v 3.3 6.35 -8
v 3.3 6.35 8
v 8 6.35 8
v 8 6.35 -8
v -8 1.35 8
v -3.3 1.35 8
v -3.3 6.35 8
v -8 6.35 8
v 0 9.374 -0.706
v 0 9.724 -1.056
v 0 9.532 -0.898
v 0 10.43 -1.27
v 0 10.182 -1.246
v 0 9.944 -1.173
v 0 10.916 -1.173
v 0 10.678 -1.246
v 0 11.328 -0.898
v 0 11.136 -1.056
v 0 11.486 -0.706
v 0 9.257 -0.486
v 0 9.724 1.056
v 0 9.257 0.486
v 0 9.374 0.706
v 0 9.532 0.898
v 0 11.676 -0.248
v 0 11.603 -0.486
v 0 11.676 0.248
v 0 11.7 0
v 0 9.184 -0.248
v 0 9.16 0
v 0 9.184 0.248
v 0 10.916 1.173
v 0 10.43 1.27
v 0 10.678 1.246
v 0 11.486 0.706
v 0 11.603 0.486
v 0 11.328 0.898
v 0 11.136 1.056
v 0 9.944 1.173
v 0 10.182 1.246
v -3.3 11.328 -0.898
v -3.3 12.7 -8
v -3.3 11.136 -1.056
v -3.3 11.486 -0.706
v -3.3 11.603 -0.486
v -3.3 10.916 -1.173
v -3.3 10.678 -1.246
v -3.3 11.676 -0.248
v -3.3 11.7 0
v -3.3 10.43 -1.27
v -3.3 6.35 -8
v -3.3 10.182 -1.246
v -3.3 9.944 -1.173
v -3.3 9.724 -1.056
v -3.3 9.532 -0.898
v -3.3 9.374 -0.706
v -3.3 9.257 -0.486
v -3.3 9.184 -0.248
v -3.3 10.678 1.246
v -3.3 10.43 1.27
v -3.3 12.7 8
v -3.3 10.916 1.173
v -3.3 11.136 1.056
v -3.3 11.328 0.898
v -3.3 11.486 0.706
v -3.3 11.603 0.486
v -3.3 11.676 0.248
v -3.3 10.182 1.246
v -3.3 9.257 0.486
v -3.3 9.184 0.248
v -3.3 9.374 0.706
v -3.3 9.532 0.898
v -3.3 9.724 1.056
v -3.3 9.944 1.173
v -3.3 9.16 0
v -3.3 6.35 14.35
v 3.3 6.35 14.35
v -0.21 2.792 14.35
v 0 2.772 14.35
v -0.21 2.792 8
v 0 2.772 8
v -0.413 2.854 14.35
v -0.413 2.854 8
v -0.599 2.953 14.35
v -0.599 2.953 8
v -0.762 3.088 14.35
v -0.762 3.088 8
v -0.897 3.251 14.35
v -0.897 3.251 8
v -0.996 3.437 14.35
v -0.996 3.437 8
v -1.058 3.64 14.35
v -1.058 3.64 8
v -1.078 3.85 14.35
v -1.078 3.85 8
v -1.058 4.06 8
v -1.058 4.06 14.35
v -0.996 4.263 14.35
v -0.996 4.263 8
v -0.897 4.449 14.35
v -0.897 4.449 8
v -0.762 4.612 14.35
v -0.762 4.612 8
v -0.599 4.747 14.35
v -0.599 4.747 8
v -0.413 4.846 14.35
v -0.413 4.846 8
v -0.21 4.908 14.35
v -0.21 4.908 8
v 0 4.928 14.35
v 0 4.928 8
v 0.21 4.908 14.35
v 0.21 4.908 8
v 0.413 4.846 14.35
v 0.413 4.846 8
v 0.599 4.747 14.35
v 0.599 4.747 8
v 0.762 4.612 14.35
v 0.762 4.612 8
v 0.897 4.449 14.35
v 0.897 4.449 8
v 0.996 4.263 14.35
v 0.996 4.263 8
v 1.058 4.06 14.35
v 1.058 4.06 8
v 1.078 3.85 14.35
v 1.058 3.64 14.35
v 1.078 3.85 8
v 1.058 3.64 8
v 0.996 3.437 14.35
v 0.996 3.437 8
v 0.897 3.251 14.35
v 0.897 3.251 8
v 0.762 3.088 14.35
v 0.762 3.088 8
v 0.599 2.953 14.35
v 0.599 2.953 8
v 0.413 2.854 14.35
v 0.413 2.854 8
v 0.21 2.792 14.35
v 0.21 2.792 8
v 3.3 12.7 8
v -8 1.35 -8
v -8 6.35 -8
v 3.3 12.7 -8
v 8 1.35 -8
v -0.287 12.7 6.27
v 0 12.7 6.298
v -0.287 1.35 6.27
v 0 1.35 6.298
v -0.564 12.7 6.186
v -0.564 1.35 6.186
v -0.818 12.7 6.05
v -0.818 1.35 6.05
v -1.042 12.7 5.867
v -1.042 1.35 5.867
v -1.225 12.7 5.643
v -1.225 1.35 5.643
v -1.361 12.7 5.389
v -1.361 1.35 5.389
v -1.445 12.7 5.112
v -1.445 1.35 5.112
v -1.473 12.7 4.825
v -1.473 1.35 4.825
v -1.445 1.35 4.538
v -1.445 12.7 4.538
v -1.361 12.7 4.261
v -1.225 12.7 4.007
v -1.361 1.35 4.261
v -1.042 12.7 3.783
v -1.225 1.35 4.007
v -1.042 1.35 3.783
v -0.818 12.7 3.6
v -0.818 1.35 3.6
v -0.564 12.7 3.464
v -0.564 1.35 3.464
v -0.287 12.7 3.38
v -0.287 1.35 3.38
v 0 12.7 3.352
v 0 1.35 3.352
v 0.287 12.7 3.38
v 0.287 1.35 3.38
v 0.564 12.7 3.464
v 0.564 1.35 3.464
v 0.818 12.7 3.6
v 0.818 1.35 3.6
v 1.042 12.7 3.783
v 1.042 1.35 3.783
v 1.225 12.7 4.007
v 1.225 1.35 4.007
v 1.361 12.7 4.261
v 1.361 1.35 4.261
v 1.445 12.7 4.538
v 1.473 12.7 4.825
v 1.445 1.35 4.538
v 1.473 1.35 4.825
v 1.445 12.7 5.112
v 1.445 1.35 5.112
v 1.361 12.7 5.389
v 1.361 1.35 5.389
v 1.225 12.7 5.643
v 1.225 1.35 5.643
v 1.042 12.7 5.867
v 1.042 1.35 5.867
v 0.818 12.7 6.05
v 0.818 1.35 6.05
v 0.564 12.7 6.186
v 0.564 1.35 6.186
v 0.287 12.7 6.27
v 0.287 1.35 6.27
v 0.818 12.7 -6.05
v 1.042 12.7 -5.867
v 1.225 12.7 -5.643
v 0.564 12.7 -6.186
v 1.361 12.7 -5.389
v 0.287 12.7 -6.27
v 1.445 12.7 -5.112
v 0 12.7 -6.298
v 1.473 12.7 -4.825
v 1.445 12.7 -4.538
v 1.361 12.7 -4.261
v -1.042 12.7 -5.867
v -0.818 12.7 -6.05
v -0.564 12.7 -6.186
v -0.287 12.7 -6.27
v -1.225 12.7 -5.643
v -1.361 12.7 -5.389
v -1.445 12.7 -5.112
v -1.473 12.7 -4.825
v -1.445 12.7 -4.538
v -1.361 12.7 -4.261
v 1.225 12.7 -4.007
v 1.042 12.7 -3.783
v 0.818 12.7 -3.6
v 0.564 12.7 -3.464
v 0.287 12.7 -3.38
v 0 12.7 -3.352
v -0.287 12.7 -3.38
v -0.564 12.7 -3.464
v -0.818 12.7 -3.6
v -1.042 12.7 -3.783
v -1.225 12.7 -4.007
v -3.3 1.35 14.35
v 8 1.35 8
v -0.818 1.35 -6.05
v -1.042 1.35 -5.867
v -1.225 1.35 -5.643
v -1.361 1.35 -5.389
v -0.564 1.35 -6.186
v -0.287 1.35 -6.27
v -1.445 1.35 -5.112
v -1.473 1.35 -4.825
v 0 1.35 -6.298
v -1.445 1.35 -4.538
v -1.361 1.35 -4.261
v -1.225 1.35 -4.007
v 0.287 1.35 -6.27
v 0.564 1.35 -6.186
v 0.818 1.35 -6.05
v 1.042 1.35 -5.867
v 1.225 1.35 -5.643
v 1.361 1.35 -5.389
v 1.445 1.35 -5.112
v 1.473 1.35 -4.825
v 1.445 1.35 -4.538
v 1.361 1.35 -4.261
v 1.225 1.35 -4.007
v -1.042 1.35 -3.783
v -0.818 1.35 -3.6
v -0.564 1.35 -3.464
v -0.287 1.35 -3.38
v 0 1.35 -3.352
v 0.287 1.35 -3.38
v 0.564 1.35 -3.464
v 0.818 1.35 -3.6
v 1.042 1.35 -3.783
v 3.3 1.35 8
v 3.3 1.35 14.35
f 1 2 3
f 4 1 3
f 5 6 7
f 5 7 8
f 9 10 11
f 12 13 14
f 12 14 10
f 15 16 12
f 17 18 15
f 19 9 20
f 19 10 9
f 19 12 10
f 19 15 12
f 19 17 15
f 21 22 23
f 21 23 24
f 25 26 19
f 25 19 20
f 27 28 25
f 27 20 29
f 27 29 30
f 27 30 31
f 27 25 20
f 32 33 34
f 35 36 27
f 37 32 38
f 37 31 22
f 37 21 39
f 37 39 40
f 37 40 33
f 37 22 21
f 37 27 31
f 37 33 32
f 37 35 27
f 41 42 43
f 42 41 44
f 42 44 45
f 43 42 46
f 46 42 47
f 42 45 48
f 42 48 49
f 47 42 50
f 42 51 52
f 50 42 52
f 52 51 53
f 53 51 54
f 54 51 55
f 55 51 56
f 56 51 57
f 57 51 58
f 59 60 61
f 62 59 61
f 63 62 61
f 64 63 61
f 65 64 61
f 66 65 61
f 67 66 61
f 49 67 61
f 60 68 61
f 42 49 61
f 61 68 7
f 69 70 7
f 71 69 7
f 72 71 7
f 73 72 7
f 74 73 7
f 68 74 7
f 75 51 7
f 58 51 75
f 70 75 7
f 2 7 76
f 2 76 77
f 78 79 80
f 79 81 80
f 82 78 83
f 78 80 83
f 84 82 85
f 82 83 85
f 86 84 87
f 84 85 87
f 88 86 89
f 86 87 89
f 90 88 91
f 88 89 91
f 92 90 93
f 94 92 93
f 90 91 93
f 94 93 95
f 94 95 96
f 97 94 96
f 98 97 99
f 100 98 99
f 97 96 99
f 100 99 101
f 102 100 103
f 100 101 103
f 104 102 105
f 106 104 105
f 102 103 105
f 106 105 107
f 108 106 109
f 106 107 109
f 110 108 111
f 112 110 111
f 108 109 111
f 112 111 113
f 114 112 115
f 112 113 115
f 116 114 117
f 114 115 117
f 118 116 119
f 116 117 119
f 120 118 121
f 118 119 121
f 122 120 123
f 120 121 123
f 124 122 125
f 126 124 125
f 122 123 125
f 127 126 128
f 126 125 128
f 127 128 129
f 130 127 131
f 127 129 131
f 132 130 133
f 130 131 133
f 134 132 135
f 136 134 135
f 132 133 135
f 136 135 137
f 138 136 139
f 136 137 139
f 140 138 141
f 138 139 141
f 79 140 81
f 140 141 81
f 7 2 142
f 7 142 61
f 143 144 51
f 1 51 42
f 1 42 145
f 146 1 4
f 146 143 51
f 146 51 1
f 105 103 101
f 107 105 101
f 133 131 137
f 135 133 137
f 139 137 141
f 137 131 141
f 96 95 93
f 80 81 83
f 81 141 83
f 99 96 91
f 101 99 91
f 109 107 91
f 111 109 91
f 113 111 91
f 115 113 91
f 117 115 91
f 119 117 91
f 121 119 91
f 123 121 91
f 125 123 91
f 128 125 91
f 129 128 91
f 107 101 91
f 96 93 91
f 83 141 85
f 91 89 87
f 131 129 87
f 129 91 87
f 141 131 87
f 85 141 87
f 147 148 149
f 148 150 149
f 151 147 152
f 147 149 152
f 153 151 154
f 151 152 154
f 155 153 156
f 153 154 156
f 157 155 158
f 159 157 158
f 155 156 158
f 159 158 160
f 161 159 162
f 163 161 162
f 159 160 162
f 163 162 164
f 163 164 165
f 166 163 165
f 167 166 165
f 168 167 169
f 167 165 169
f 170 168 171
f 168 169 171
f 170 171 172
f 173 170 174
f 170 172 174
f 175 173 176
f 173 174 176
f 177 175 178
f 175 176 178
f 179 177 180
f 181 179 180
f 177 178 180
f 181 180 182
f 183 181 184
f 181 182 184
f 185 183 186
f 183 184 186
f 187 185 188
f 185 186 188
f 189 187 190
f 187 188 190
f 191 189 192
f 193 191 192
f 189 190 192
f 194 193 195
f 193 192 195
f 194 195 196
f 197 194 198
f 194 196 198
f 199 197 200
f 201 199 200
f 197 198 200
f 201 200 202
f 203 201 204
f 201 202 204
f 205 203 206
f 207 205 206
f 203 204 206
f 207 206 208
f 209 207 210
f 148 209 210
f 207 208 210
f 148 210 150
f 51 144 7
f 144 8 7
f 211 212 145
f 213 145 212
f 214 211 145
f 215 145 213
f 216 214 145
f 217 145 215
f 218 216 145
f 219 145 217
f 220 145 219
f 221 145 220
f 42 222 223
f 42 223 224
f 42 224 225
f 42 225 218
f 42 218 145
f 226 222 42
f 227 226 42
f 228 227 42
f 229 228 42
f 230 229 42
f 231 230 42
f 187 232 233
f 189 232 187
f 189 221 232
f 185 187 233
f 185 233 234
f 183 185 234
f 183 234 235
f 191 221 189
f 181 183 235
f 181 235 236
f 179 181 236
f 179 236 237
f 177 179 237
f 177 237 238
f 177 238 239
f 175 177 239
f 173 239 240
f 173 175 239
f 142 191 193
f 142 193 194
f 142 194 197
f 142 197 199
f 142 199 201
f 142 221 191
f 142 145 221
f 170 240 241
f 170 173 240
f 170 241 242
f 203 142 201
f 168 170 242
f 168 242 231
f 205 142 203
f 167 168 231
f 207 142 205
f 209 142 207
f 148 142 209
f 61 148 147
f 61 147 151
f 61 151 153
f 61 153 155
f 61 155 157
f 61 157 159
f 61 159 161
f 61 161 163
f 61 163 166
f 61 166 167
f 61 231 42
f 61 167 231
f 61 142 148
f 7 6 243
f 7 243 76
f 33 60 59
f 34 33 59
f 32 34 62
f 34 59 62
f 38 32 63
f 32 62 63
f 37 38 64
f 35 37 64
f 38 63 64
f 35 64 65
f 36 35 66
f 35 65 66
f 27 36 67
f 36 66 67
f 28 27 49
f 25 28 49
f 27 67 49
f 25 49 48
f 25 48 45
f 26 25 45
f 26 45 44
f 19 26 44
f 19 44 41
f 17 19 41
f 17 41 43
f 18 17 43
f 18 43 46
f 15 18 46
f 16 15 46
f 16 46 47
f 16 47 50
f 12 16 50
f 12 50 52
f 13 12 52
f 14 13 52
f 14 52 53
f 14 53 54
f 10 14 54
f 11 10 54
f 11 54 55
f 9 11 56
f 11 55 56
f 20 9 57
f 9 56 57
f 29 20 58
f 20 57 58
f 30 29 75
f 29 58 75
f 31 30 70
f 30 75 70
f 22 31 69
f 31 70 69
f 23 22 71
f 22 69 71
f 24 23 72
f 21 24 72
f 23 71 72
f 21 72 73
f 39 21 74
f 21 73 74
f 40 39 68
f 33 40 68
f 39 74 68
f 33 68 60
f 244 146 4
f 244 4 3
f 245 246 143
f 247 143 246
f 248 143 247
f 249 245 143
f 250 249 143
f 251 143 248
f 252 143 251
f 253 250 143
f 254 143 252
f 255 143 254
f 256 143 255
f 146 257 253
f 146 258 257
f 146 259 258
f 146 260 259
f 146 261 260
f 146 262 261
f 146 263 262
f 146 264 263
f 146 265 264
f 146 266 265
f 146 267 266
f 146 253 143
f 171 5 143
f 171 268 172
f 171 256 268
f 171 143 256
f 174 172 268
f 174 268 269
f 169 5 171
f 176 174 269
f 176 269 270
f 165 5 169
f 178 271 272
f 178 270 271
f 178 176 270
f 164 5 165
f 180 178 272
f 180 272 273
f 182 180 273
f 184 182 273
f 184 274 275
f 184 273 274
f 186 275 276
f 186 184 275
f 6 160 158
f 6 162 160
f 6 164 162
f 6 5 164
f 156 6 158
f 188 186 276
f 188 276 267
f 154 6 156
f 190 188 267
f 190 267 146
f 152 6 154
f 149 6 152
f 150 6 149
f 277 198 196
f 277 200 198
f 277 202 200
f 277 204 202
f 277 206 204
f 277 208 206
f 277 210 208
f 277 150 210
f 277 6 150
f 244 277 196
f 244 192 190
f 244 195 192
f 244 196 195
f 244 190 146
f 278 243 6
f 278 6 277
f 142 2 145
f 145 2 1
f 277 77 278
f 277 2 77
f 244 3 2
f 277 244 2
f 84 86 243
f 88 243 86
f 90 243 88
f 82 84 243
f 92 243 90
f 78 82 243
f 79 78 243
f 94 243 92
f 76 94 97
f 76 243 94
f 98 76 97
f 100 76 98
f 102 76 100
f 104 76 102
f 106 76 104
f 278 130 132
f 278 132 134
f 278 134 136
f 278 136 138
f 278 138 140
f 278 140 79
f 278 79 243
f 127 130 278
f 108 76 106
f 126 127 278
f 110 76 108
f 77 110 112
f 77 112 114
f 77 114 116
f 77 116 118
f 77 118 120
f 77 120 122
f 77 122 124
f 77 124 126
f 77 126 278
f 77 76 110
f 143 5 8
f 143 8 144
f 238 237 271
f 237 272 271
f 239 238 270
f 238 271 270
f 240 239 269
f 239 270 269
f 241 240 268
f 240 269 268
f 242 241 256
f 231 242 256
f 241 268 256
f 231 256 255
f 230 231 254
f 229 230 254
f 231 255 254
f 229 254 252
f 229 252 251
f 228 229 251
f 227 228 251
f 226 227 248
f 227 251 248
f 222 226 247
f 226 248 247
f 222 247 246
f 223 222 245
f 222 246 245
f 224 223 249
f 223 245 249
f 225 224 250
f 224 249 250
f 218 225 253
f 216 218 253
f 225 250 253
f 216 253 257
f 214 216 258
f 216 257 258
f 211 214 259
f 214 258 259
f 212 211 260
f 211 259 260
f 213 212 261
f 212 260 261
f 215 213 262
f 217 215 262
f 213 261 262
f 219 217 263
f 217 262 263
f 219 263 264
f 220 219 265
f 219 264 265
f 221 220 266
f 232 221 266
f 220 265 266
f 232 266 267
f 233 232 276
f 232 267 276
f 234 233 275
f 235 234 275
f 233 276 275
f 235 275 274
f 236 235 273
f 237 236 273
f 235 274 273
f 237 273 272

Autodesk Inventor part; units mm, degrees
ref_plane "YZ Plane" through (0, 0, 0) normal (1, 0, 0) x (0, 1, 0)
ref_plane "XZ Plane" through (0, 0, 0) normal (0, 1, 0) x (-1, 0, 0)
ref_plane "XY Plane" through (0, 0, 0) normal (0, 0, 1) x (1, 0, 0)
sketch "Sketch1" plane through (0, 0, 0) normal (0, 1, 0) x (-1, 0, 0)
  point P0 (0, 0)
sketch "Sketch2" plane through (0, 0, 0) normal (0, 1, 0) x (-1, 0, 0)
  line L0 (3.3, 8) -> (-3.3, 8)
  line L1 (-3.3, 8) -> (-3.3, -8)
  line L2 (-3.3, -8) -> (3.3, -8)
  line L3 (3.3, -8) -> (3.3, 8)
  line L4 (3.3, 8) -> (-3.3, -8) construction
  line L5 (-3.3, 8) -> (3.3, -8) construction
  point P0 (0, 0)
  dimension "d0" = 6.6
  dimension "d1" = 16
extrude "Extrusion1" add sketch "Sketch2" along normal blind 6.35
sketch "Sketch3" plane through (0, 0, 0) normal (0, -1, 0) x (1, 0, 0)
  line L0 (-8, -8) -> (8, -8)
  line L1 (8, -8) -> (8, 8)
  line L2 (8, 8) -> (-8, 8)
  line L3 (-8, 8) -> (-8, -8)
  line L4 (-8, -8) -> (8, 8) construction
  line L5 (8, -8) -> (-8, 8) construction
  point P0 (0, 0)
  dimension "d13" = 16
  dimension "d14" = 16
move or copy body "Move1" bodies to move or copy 1 copy no translate (0, 6.35, 0)
extrude "Extrusion2" add sketch "Sketch3" against normal up to surface (6.35 mm away)
chamfer "Chamfer1" [suppressed]
chamfer "Chamfer2" [suppressed]
sketch "Sketch4" plane through (-3.3, 12.7, -8) normal (0, 1, 0) x (1, 0, 0)
  line L0 (4.4354, -16) -> (2.1646, -16) projected
  line L1 (-4.7, 0) -> (11.3, 0) projected
  point P0 (3.3, -8)
  point P1 (3.3, -3.175)
  point P2 (3.3, -12.825)
fillet "Fillet1" [suppressed]
sketch "Sketch5" plane through (-3.3, 12.7, 8) normal (0, 0, 1) x (1, 0, 0)
  circle A0 centre (3.3, -9.5232) radius 2.9337
  point P0 (3.3, -12.7)
extrude "Extrusion3" [suppressed]
hole "Hole3" [suppressed]
chamfer "Chamfer3" [suppressed]
sketch "Sketch6" plane through (-3.3, 12.7, -8) normal (-1, 0, 0) x (0, 0, 1)
  line L0 (0, 0) -> (16, 0) projected
  circle A0 centre (8, -2.27) radius 1.27
  point P0 (8, -12.7)
  dimension "d62" = 2.54
extrude "Extrusion4" cut sketch "Sketch6" against normal blind 3.3
sketch "Sketch7" plane through (-3.3, 12.7, 8) normal (0, 0, 1) x (1, 0, 0)
  line L0 (0, -6.35) -> (0, 0) projected
  line L1 (11.3, -12.7) -> (-4.7, -12.7) projected
  line L2 (0, -6.35) -> (6.6, -6.35)
  line L3 (6.6, -6.35) -> (6.6, -12.7)
  line L4 (6.6, -12.7) -> (0, -12.7)
  line L5 (0, -12.7) -> (0, -6.35)
  point P0 (3.3, -12.7)
  dimension "d65" = 6.6
extrude "Extrusion5" add sketch "Sketch7" along normal blind 6.35
sketch "Sketch8" plane through (0, 0, 0) normal (0, -1, 0) x (1, 0, 0)
  line L0 (-8, 8) -> (-8, -8) projected
  line L1 (-8, -8) -> (-8, 8)
  line L2 (-3.3, 8) -> (-8, 8) projected
  line L3 (-8, 8) -> (-3.3, 8)
  line L4 (-3.3, 8) -> (-3.3, 14.35) projected
  line L5 (-3.3, 8) -> (-3.3, 14.35)
  line L6 (3.3, 14.35) -> (-3.3, 14.35) projected
  line L7 (-3.3, 14.35) -> (3.3, 14.35)
  line L8 (8, 8) -> (3.3, 8) projected
  line L9 (3.3, 14.35) -> (3.3, 8)
  line L10 (3.3, 8) -> (8, 8)
  line L11 (-8, -8) -> (8, -8) projected
  line L12 (8, 8) -> (8, -8)
  line L13 (8, -8) -> (-8, -8)
  point P0 (0, 0)
hole "Hole4" at (0, 12.7, 4.825) at (0, 12.7, -4.825) direction (0, -1, 0) diameter 2.946 end through all clearance for "Flat Head Machine Screw (82)" size "#4" standard "Ansi Unified Screw Threads"
extrude "Extrusion6" cut sketch "Sketch8" against normal blind 1.35
hole "Hole6" at (0, 3.85, 14.35) direction (0, 0, -1) diameter 2.1565 depth 6.35 thread size "4-40 UNC" class "2B" standard "ANSI Unified Screw Threads"
sketch "Sketch9" plane through (0, 1.35, 0) normal (0, -1, 0) x (1, 0, 0)
  point P0 (0, 0)
  point P1 (0, 0)
properties part number "copper_top_ledgereod" material "Copper"
